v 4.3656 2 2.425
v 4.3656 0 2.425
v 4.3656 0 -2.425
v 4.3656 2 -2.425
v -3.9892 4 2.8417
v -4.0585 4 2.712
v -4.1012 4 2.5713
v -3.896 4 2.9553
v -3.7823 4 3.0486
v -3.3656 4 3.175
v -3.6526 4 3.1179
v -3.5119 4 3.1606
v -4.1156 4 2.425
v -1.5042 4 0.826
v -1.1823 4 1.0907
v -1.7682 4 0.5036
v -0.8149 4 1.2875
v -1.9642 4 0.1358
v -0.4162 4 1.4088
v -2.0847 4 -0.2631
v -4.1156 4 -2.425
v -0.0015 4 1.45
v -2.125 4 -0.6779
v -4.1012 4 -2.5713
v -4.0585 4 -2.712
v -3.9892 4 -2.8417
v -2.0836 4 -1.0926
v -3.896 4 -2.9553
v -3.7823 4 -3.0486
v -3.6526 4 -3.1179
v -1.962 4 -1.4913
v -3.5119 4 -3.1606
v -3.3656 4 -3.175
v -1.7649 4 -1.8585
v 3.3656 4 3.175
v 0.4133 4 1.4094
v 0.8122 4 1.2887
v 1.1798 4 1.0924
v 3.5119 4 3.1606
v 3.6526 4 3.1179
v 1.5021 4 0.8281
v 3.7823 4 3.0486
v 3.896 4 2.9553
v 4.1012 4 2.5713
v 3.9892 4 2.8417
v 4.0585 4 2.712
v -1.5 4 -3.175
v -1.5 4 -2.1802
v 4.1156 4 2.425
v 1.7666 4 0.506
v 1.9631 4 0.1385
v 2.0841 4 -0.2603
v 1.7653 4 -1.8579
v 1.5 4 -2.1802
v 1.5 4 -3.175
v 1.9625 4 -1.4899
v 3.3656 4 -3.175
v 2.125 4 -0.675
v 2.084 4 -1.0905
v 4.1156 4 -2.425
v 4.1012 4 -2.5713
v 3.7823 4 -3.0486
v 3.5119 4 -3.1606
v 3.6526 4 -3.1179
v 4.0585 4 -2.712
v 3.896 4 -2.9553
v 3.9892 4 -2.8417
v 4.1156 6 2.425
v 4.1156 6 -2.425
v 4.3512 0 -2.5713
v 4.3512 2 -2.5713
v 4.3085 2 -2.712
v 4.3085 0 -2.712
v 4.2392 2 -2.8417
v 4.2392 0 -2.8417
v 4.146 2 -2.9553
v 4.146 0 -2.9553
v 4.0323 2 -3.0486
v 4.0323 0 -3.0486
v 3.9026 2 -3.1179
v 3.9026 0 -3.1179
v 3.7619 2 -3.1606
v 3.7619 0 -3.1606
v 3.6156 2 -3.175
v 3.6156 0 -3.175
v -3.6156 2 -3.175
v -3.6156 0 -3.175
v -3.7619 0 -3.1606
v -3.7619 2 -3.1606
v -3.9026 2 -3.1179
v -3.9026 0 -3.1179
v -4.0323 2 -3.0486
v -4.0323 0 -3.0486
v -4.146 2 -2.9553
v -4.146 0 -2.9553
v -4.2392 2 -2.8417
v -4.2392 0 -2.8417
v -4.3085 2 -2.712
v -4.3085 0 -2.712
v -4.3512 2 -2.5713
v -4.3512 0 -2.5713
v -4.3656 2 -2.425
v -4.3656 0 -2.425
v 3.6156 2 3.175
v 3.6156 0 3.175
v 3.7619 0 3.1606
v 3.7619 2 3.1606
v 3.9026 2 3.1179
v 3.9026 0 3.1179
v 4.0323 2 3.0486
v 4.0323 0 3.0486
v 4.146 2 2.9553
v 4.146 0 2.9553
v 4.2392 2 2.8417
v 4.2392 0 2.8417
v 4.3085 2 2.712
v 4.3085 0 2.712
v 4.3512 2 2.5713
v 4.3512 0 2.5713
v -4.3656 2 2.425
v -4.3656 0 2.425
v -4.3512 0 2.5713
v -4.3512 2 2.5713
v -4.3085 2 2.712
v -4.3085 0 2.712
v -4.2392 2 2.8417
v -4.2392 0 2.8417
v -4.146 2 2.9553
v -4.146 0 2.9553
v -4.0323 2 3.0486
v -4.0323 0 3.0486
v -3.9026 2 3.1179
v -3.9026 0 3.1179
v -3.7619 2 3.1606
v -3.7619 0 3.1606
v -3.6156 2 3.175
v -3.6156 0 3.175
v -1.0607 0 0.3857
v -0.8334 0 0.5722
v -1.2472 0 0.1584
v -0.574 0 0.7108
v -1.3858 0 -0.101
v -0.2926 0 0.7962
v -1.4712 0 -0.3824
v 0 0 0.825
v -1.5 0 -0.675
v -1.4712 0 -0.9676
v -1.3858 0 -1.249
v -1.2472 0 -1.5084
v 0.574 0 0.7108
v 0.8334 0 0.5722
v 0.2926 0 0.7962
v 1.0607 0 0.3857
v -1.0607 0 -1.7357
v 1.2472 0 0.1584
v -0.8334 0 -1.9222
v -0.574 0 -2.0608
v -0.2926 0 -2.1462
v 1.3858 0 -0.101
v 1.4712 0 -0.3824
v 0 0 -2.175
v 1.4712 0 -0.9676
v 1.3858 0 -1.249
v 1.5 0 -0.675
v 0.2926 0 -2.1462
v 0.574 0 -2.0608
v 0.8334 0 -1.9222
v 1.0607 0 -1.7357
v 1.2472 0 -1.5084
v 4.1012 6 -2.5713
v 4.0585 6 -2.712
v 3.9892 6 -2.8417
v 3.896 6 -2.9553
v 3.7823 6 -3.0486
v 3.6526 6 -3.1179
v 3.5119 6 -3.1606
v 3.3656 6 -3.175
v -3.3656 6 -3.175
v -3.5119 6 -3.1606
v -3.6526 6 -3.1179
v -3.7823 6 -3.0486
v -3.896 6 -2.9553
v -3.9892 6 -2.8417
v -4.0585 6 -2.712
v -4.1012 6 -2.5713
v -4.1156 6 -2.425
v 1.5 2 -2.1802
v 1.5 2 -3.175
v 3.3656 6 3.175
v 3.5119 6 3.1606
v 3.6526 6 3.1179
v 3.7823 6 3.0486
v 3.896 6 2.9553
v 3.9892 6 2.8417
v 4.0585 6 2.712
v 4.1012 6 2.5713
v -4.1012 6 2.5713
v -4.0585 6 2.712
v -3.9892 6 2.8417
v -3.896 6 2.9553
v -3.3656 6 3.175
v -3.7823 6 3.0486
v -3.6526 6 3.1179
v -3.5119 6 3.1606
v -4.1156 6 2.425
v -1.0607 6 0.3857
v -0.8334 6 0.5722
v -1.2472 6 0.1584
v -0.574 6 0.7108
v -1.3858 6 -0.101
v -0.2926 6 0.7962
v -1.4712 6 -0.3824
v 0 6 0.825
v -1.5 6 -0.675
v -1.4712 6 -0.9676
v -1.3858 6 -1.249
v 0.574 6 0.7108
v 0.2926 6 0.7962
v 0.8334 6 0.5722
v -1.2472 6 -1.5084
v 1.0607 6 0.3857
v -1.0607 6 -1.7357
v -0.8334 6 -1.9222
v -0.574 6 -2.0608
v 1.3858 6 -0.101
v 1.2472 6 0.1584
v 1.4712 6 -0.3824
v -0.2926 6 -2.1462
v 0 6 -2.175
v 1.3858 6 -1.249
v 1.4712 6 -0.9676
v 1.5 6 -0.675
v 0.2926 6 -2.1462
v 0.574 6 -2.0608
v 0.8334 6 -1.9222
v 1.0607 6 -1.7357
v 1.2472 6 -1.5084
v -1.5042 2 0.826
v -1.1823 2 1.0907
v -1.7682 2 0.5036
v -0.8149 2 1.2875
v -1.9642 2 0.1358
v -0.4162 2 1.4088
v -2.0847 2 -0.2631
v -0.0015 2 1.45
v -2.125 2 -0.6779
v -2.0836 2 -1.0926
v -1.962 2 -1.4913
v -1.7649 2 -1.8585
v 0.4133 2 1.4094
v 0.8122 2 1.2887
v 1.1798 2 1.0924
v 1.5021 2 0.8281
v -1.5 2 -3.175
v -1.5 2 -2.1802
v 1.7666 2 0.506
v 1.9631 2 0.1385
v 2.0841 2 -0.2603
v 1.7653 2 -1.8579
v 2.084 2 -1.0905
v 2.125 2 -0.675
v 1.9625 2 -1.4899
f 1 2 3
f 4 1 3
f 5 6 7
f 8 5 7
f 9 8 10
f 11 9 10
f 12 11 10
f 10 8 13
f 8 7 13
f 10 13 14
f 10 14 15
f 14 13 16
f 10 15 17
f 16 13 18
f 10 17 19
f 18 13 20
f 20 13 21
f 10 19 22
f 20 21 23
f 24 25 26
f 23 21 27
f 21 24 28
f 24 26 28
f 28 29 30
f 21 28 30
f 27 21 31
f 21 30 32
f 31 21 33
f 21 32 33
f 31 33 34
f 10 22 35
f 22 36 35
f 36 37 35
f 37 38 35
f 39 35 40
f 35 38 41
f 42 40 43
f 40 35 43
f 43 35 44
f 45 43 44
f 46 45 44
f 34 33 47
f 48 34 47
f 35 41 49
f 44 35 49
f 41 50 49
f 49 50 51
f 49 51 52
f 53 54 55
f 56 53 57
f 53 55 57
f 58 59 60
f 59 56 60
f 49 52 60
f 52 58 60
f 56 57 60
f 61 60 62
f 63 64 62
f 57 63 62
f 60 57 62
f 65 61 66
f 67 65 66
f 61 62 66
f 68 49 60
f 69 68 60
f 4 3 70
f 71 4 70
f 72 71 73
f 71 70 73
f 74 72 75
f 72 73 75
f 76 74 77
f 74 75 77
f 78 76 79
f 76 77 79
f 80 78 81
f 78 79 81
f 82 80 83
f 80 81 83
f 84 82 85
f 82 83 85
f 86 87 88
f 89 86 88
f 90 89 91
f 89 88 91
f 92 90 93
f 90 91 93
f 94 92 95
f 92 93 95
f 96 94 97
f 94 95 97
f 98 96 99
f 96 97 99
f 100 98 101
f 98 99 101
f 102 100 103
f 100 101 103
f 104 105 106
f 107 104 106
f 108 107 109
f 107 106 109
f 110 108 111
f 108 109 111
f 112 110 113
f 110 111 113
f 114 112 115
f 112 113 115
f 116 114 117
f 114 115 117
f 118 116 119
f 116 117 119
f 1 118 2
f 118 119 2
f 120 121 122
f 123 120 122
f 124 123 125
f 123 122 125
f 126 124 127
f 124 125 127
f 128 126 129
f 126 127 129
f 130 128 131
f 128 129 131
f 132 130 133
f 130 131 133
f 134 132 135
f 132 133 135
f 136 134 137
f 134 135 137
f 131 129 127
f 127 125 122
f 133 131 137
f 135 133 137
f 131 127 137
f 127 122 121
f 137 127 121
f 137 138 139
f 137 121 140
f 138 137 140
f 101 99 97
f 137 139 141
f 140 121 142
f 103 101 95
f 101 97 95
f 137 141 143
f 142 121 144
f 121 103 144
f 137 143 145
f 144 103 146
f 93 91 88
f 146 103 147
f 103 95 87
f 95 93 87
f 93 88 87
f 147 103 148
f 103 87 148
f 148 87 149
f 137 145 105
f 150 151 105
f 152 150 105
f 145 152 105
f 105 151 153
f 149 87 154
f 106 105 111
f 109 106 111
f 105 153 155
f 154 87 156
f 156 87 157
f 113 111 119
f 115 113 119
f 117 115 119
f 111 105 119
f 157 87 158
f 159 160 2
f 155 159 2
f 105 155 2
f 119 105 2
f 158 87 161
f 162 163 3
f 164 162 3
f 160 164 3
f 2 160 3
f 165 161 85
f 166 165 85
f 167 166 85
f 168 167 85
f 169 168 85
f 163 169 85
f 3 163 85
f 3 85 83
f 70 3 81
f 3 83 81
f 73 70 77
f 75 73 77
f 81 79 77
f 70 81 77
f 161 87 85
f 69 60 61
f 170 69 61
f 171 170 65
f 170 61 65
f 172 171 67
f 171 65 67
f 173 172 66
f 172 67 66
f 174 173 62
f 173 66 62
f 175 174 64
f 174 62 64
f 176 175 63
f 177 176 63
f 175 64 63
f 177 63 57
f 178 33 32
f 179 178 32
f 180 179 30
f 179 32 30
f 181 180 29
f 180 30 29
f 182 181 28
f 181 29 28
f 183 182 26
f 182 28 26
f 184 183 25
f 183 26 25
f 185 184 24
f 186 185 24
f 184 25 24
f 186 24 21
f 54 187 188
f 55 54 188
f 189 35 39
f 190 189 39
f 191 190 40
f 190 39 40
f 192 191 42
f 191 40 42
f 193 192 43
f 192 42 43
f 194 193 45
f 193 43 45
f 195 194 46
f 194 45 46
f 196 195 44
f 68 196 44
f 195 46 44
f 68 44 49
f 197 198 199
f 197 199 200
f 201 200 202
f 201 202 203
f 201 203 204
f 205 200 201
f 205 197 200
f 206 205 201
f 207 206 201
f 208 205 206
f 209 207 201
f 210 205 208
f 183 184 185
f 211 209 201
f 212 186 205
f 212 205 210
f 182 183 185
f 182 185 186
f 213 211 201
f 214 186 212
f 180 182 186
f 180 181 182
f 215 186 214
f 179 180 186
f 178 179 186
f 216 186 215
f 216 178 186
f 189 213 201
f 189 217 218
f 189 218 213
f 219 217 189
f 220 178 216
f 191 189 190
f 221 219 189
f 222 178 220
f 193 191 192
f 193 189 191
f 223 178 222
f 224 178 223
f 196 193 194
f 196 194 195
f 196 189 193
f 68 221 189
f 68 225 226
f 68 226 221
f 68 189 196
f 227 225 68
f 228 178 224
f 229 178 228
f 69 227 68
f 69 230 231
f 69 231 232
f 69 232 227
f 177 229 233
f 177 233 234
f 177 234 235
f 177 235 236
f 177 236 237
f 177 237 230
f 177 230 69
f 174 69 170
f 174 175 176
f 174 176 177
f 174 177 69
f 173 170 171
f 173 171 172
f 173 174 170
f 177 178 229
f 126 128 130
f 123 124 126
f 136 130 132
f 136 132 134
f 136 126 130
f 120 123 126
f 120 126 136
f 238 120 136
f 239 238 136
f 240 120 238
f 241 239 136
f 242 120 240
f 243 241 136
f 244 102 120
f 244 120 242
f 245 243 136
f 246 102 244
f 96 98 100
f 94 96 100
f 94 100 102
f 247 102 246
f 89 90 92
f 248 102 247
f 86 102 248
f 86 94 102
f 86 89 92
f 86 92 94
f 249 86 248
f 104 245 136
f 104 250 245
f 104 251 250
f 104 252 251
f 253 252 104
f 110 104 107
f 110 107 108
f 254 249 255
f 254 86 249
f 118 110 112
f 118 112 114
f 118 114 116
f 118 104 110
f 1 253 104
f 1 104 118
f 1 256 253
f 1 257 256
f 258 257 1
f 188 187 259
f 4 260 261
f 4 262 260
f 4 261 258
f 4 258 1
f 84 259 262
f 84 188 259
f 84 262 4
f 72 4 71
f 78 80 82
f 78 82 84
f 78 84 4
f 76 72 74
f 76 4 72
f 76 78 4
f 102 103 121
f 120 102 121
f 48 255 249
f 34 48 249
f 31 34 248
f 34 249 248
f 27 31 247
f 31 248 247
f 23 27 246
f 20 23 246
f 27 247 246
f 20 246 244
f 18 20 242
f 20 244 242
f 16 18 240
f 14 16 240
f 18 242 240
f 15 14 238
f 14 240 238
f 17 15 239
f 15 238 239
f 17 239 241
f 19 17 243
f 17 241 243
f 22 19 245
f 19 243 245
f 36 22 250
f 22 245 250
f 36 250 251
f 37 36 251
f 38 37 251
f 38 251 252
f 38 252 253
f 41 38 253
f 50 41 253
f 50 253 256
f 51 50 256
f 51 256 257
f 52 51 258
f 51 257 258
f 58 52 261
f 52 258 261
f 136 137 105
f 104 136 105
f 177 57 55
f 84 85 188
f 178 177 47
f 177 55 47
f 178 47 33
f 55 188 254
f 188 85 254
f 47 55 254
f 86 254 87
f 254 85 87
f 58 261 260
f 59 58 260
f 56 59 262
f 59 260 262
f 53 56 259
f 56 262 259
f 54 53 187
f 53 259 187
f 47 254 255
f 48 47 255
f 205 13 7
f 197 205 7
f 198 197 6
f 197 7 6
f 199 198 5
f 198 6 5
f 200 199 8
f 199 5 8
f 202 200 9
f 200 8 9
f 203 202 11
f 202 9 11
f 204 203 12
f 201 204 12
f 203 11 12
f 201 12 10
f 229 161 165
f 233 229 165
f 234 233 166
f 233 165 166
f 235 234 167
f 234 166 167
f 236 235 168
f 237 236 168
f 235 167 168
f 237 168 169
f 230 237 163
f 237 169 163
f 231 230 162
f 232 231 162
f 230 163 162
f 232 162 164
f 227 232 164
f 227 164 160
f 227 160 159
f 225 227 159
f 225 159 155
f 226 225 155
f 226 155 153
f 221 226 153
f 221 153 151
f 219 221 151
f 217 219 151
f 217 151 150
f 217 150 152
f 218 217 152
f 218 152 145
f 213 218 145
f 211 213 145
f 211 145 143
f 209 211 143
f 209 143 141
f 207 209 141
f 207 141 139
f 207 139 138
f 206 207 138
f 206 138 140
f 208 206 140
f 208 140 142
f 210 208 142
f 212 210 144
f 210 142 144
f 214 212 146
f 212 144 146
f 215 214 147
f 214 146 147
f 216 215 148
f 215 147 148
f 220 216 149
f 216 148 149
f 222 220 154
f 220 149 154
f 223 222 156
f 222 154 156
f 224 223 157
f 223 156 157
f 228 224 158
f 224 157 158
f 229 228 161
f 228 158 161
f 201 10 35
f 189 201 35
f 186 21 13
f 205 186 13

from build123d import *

# Parameters (mm, degrees)
BOSS_EXTRUDE1_DEPTH = 2.00000108
BOSS_EXTRUDE2_DEPTH = 2.00000108
BOSS_EXTRUDE3_DEPTH = 2.00000108
SKETCH4_R           = 1.499997
CUT_EXTRUDE1_DEPTH  = 9.070894964


with BuildPart() as part:
    # Sketch1 → Boss-Extrude1 (new body)
    with BuildSketch(Plane(origin=(0, 0, 0), x_dir=(1, 0, 0), z_dir=(0, 1, 0))):
        with BuildLine():
            Line((-3.61562396, -3.175), (3.61562396, -3.175))
            ThreePointArc((3.61562396, -3.175), (4.145954781, -2.955329781), (4.365625, -2.42499896))
            Line((4.365625, -2.42499896), (4.365625, 2.42499896))
            ThreePointArc((4.365625, 2.42499896), (4.145954781, 2.955329781), (3.61562396, 3.175))
            Line((3.61562396, 3.175), (-3.61562396, 3.175))
            ThreePointArc((-3.61562396, 3.175), (-4.145954781, 2.955329781), (-4.365625, 2.42499896))
            Line((-4.365625, 2.42499896), (-4.365625, -2.42499896))
            ThreePointArc((-4.365625, -2.42499896), (-4.145954781, -2.955329781), (-3.61562396, -3.175))
        make_face()
    extrude(amount=BOSS_EXTRUDE1_DEPTH)

    # Sketch2 → Boss-Extrude2 (add)
    with BuildSketch(Plane(origin=(0, 2.00000108, 0), x_dir=(1, 0, 0), z_dir=(0, 1, 0))):
        with BuildLine():
            Line((-1.50000081, 2.180197814), (-1.50000081, 2.17499946))
            Line((-1.50000081, 2.17499946), (1.50000081, 2.17499946))
            Line((1.50000081, 2.17499946), (1.50000081, 2.180197814))
            ThreePointArc((1.50000081, 2.180197814), (0, 2.79999948), (-1.50000081, 2.180197814))
        make_face()
        with BuildLine():
            Line((1.50000081, 2.17499946), (-1.50000081, 2.17499946))
            Line((-1.50000081, 2.17499946), (-1.50000081, 2.180197814))
            ThreePointArc((-1.50000081, 2.180197814), (-0.814899401, -1.287539785), (2.12499956, 0.67499992))
            ThreePointArc((2.12499956, 0.67499992), (1.962539705, 1.489899321), (1.50000081, 2.180197814))
            Line((1.50000081, 2.180197814), (1.50000081, 2.17499946))
        make_face()
        with BuildLine():
            Line((-1.50000081, 3.175), (-1.50000081, 2.180197814))
            ThreePointArc((-1.50000081, 2.180197814), (0, 2.79999948), (1.50000081, 2.180197814))
            Line((1.50000081, 2.180197814), (1.50000081, 3.175))
            Line((1.50000081, 3.175), (-1.50000081, 3.175))
        make_face()
    extrude(amount=BOSS_EXTRUDE2_DEPTH)

    # Sketch3 → Boss-Extrude3 (add)
    with BuildSketch(Plane(origin=(0, 4.00000216, 0), x_dir=(1, 0, 0), z_dir=(0, 1, 0))):
        with BuildLine():
            Line((-4.115624992, 2.42499896), (-4.115624992, -2.42499896))
            ThreePointArc((-4.115624992, -2.42499896), (-3.895954773, -2.955329781), (-3.365623952, -3.175))
            Line((-3.365623952, -3.175), (3.365623952, -3.175))
            ThreePointArc((3.365623952, -3.175), (3.895954773, -2.955329781), (4.115624992, -2.42499896))
            Line((4.115624992, -2.42499896), (4.115624992, 2.42499896))
            ThreePointArc((4.115624992, 2.42499896), (3.895954773, 2.955329781), (3.365623952, 3.175))
            Line((3.365623952, 3.175), (-3.365623952, 3.175))
            ThreePointArc((-3.365623952, 3.175), (-3.895954773, 2.955329781), (-4.115624992, 2.42499896))
        make_face()
    extrude(amount=BOSS_EXTRUDE3_DEPTH)

    # Sketch4 → Cut-Extrude1 (cut, through all)
    with BuildSketch(Plane.XZ):
        with Locations(Location((0, -0.67499992, 0), (0, 0, 270))):
            Circle(SKETCH4_R)
    extrude(amount=-CUT_EXTRUDE1_DEPTH, mode=Mode.SUBTRACT)


solid = part.part
